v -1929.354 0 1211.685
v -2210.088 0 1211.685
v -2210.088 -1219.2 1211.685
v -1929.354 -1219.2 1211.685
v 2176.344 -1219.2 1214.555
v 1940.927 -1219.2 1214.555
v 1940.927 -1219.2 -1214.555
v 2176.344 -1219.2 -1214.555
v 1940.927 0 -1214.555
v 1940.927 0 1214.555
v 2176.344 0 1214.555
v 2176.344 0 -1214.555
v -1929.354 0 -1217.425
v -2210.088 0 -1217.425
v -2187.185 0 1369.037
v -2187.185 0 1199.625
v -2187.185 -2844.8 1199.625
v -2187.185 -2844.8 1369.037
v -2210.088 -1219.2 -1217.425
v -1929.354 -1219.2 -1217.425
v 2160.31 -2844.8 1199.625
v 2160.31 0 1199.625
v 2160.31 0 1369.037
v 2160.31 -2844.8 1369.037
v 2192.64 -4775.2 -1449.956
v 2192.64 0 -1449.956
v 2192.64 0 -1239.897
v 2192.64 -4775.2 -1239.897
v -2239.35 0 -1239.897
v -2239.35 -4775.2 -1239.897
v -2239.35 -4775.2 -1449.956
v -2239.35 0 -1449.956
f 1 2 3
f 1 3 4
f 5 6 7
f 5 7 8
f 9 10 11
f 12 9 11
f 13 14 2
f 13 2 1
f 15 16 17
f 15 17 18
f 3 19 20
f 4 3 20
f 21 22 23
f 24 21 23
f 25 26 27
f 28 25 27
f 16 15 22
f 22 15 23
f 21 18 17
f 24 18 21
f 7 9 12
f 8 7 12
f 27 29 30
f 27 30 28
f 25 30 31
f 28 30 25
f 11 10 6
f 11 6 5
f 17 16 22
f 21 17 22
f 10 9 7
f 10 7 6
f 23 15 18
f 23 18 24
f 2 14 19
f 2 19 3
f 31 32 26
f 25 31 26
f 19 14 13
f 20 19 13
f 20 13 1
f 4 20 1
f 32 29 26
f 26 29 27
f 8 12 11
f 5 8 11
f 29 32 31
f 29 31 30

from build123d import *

# Parameters (mm, degrees)
F0_W     = 280.7343
F0_H     = 2429.11005
F0_W_2   = 235.417038
F1_DEPTH = 1219.2
F2_W     = 4347.495317
F2_H     = 169.412613
F3_DEPTH = 2844.8
F4_W     = 4431.990624
F4_H     = 210.059166
F5_DEPTH = 4775.2


with BuildPart() as f1:
    # F0 (on Front) → F1 (new body)
    with BuildSketch(Plane.XZ):
        with Locations((-2069.721341, -2.870083)):
            Rectangle(F0_W, F0_H)
        with Locations((2058.635786, 0)):
            Rectangle(F0_W_2, F0_H)
    extrude(amount=F1_DEPTH)


with BuildPart() as f3:
    # F2 (on Front) → F3 (new body)
    with BuildSketch(Plane.XZ):
        with Locations((-13.43739, 1284.331083)):
            Rectangle(F2_W, F2_H)
    extrude(amount=F3_DEPTH)


with BuildPart() as f5:
    # F4 (on Front) → F5 (new body)
    with BuildSketch(Plane.XZ):
        with Locations((-23.355007, -1344.926596)):
            Rectangle(F4_W, F4_H)
    extrude(amount=F5_DEPTH)


solid = Compound([f1.part, f3.part, f5.part])
